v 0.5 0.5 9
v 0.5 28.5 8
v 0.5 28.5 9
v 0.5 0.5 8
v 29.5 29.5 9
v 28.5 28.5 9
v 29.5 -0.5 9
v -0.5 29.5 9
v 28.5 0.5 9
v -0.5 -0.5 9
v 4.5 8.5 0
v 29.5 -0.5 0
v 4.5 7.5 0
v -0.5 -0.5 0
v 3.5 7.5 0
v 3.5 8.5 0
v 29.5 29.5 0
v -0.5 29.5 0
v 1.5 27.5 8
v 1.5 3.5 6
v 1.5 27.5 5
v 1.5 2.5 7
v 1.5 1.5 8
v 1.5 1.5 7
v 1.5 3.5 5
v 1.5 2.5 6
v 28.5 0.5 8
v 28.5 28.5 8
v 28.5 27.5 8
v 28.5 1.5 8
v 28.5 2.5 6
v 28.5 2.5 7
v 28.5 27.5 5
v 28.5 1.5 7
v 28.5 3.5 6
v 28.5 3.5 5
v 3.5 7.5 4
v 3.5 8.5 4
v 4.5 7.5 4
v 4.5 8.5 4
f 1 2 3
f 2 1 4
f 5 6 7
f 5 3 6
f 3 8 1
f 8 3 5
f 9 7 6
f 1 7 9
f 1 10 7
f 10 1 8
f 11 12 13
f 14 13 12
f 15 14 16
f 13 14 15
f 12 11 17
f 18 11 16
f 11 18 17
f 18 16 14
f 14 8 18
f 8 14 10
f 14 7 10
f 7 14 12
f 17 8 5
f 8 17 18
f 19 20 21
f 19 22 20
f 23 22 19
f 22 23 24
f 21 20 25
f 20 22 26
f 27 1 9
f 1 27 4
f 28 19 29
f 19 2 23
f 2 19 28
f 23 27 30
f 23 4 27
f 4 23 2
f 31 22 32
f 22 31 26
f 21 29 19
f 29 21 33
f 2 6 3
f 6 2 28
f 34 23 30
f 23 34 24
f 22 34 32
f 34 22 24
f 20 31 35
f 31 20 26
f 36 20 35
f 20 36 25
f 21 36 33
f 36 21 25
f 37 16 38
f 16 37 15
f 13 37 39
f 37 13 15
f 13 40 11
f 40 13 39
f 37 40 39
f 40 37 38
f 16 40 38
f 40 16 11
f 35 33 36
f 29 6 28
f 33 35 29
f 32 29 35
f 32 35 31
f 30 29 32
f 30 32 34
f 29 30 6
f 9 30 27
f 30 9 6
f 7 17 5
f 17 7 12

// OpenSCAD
union() {
    translate([0, 0, 4.5]) cube([1, 1, 9], center=true);
    translate([0, 1, 4.5]) cube([1, 1, 9], center=true);
    translate([0, 2, 4.5]) cube([1, 1, 9], center=true);
    translate([0, 3, 4.5]) cube([1, 1, 9], center=true);
    translate([0, 4, 4.5]) cube([1, 1, 9], center=true);
    translate([0, 5, 4.5]) cube([1, 1, 9], center=true);
    translate([0, 6, 4.5]) cube([1, 1, 9], center=true);
    translate([0, 7, 4.5]) cube([1, 1, 9], center=true);
    translate([0, 8, 4.5]) cube([1, 1, 9], center=true);
    translate([0, 9, 4.5]) cube([1, 1, 9], center=true);
    translate([0, 10, 4.5]) cube([1, 1, 9], center=true);
    translate([0, 11, 4.5]) cube([1, 1, 9], center=true);
    translate([0, 12, 4.5]) cube([1, 1, 9], center=true);
    translate([0, 13, 4.5]) cube([1, 1, 9], center=true);
    translate([0, 14, 4.5]) cube([1, 1, 9], center=true);
    translate([0, 15, 4.5]) cube([1, 1, 9], center=true);
    translate([0, 16, 4.5]) cube([1, 1, 9], center=true);
    translate([0, 17, 4.5]) cube([1, 1, 9], center=true);
    translate([0, 18, 4.5]) cube([1, 1, 9], center=true);
    translate([0, 19, 4.5]) cube([1, 1, 9], center=true);
    translate([0, 20, 4.5]) cube([1, 1, 9], center=true);
    translate([0, 21, 4.5]) cube([1, 1, 9], center=true);
    translate([0, 22, 4.5]) cube([1, 1, 9], center=true);
    translate([0, 23, 4.5]) cube([1, 1, 9], center=true);
    translate([0, 24, 4.5]) cube([1, 1, 9], center=true);
    translate([0, 25, 4.5]) cube([1, 1, 9], center=true);
    translate([0, 26, 4.5]) cube([1, 1, 9], center=true);
    translate([0, 27, 4.5]) cube([1, 1, 9], center=true);
    translate([0, 28, 4.5]) cube([1, 1, 9], center=true);
    translate([0, 29, 4.5]) cube([1, 1, 9], center=true);
    translate([1, 0, 4.5]) cube([1, 1, 9], center=true);
    translate([1, 1, 4.0]) cube([1, 1, 8], center=true);
    translate([1, 2, 4.0]) cube([1, 1, 8], center=true);
    translate([1, 3, 4.0]) cube([1, 1, 8], center=true);
    translate([1, 4, 4.0]) cube([1, 1, 8], center=true);
    translate([1, 5, 4.0]) cube([1, 1, 8], center=true);
    translate([1, 6, 4.0]) cube([1, 1, 8], center=true);
    translate([1, 7, 4.0]) cube([1, 1, 8], center=true);
    translate([1, 8, 4.0]) cube([1, 1, 8], center=true);
    translate([1, 9, 4.0]) cube([1, 1, 8], center=true);
    translate([1, 10, 4.0]) cube([1, 1, 8], center=true);
    translate([1, 11, 4.0]) cube([1, 1, 8], center=true);
    translate([1, 12, 4.0]) cube([1, 1, 8], center=true);
    translate([1, 13, 4.0]) cube([1, 1, 8], center=true);
    translate([1, 14, 4.0]) cube([1, 1, 8], center=true);
    translate([1, 15, 4.0]) cube([1, 1, 8], center=true);
    translate([1, 16, 4.0]) cube([1, 1, 8], center=true);
    translate([1, 17, 4.0]) cube([1, 1, 8], center=true);
    translate([1, 18, 4.0]) cube([1, 1, 8], center=true);
    translate([1, 19, 4.0]) cube([1, 1, 8], center=true);
    translate([1, 20, 4.0]) cube([1, 1, 8], center=true);
    translate([1, 21, 4.0]) cube([1, 1, 8], center=true);
    translate([1, 22, 4.0]) cube([1, 1, 8], center=true);
    translate([1, 23, 4.0]) cube([1, 1, 8], center=true);
    translate([1, 24, 4.0]) cube([1, 1, 8], center=true);
    translate([1, 25, 4.0]) cube([1, 1, 8], center=true);
    translate([1, 26, 4.0]) cube([1, 1, 8], center=true);
    translate([1, 27, 4.0]) cube([1, 1, 8], center=true);
    translate([1, 28, 4.0]) cube([1, 1, 8], center=true);
    translate([1, 29, 4.5]) cube([1, 1, 9], center=true);
    translate([2, 0, 4.5]) cube([1, 1, 9], center=true);
    translate([2, 1, 4.0]) cube([1, 1, 8], center=true);
    translate([2, 2, 3.5]) cube([1, 1, 7], center=true);
    translate([2, 3, 3.0]) cube([1, 1, 6], center=true);
    translate([2, 4, 2.5]) cube([1, 1, 5], center=true);
    translate([2, 5, 2.5]) cube([1, 1, 5], center=true);
    translate([2, 6, 2.5]) cube([1, 1, 5], center=true);
    translate([2, 7, 2.5]) cube([1, 1, 5], center=true);
    translate([2, 8, 2.5]) cube([1, 1, 5], center=true);
    translate([2, 9, 2.5]) cube([1, 1, 5], center=true);
    translate([2, 10, 2.5]) cube([1, 1, 5], center=true);
    translate([2, 11, 2.5]) cube([1, 1, 5], center=true);
    translate([2, 12, 2.5]) cube([1, 1, 5], center=true);
    translate([2, 13, 2.5]) cube([1, 1, 5], center=true);
    translate([2, 14, 2.5]) cube([1, 1, 5], center=true);
    translate([2, 15, 2.5]) cube([1, 1, 5], center=true);
    translate([2, 16, 2.5]) cube([1, 1, 5], center=true);
    translate([2, 17, 2.5]) cube([1, 1, 5], center=true);
    translate([2, 18, 2.5]) cube([1, 1, 5], center=true);
    translate([2, 19, 2.5]) cube([1, 1, 5], center=true);
    translate([2, 20, 2.5]) cube([1, 1, 5], center=true);
    translate([2, 21, 2.5]) cube([1, 1, 5], center=true);
    translate([2, 22, 2.5]) cube([1, 1, 5], center=true);
    translate([2, 23, 2.5]) cube([1, 1, 5], center=true);
    translate([2, 24, 2.5]) cube([1, 1, 5], center=true);
    translate([2, 25, 2.5]) cube([1, 1, 5], center=true);
    translate([2, 26, 2.5]) cube([1, 1, 5], center=true);
    translate([2, 27, 2.5]) cube([1, 1, 5], center=true);
    translate([2, 28, 4.0]) cube([1, 1, 8], center=true);
    translate([2, 29, 4.5]) cube([1, 1, 9], center=true);
    translate([3, 0, 4.5]) cube([1, 1, 9], center=true);
    translate([3, 1, 4.0]) cube([1, 1, 8], center=true);
    translate([3, 2, 3.5]) cube([1, 1, 7], center=true);
    translate([3, 3, 3.0]) cube([1, 1, 6], center=true);
    translate([3, 4, 2.5]) cube([1, 1, 5], center=true);
    translate([3, 5, 2.5]) cube([1, 1, 5], center=true);
    translate([3, 6, 2.5]) cube([1, 1, 5], center=true);
    translate([3, 7, 2.5]) cube([1, 1, 5], center=true);
    translate([3, 8, 2.5]) cube([1, 1, 5], center=true);
    translate([3, 9, 2.5]) cube([1, 1, 5], center=true);
    translate([3, 10, 2.5]) cube([1, 1, 5], center=true);
    translate([3, 11, 2.5]) cube([1, 1, 5], center=true);
    translate([3, 12, 2.5]) cube([1, 1, 5], center=true);
    translate([3, 13, 2.5]) cube([1, 1, 5], center=true);
    translate([3, 14, 2.5]) cube([1, 1, 5], center=true);
    translate([3, 15, 2.5]) cube([1, 1, 5], center=true);
    translate([3, 16, 2.5]) cube([1, 1, 5], center=true);
    translate([3, 17, 2.5]) cube([1, 1, 5], center=true);
    translate([3, 18, 2.5]) cube([1, 1, 5], center=true);
    translate([3, 19, 2.5]) cube([1, 1, 5], center=true);
    translate([3, 20, 2.5]) cube([1, 1, 5], center=true);
    translate([3, 21, 2.5]) cube([1, 1, 5], center=true);
    translate([3, 22, 2.5]) cube([1, 1, 5], center=true);
    translate([3, 23, 2.5]) cube([1, 1, 5], center=true);
    translate([3, 24, 2.5]) cube([1, 1, 5], center=true);
    translate([3, 25, 2.5]) cube([1, 1, 5], center=true);
    translate([3, 26, 2.5]) cube([1, 1, 5], center=true);
    translate([3, 27, 2.5]) cube([1, 1, 5], center=true);
    translate([3, 28, 4.0]) cube([1, 1, 8], center=true);
    translate([3, 29, 4.5]) cube([1, 1, 9], center=true);
    translate([4, 0, 4.5]) cube([1, 1, 9], center=true);
    translate([4, 1, 4.0]) cube([1, 1, 8], center=true);
    translate([4, 2, 3.5]) cube([1, 1, 7], center=true);
    translate([4, 3, 3.0]) cube([1, 1, 6], center=true);
    translate([4, 4, 2.5]) cube([1, 1, 5], center=true);
    translate([4, 5, 2.5]) cube([1, 1, 5], center=true);
    translate([4, 6, 2.5]) cube([1, 1, 5], center=true);
    translate([4, 7, 2.5]) cube([1, 1, 5], center=true);
    translate([4, 8, 4.5]) color([1, 0, 0]) cube([1, 1, 1], center=true);
    translate([4, 9, 2.5]) cube([1, 1, 5], center=true);
    translate([4, 10, 2.5]) cube([1, 1, 5], center=true);
    translate([4, 11, 2.5]) cube([1, 1, 5], center=true);
    translate([4, 12, 2.5]) cube([1, 1, 5], center=true);
    translate([4, 13, 2.5]) cube([1, 1, 5], center=true);
    translate([4, 14, 2.5]) cube([1, 1, 5], center=true);
    translate([4, 15, 2.5]) cube([1, 1, 5], center=true);
    translate([4, 16, 2.5]) cube([1, 1, 5], center=true);
    translate([4, 17, 2.5]) cube([1, 1, 5], center=true);
    translate([4, 18, 2.5]) cube([1, 1, 5], center=true);
    translate([4, 19, 2.5]) cube([1, 1, 5], center=true);
    translate([4, 20, 2.5]) cube([1, 1, 5], center=true);
    translate([4, 21, 2.5]) cube([1, 1, 5], center=true);
    translate([4, 22, 2.5]) cube([1, 1, 5], center=true);
    translate([4, 23, 2.5]) cube([1, 1, 5], center=true);
    translate([4, 24, 2.5]) cube([1, 1, 5], center=true);
    translate([4, 25, 2.5]) cube([1, 1, 5], center=true);
    translate([4, 26, 2.5]) cube([1, 1, 5], center=true);
    translate([4, 27, 2.5]) cube([1, 1, 5], center=true);
    translate([4, 28, 4.0]) cube([1, 1, 8], center=true);
    translate([4, 29, 4.5]) cube([1, 1, 9], center=true);
    translate([5, 0, 4.5]) cube([1, 1, 9], center=true);
    translate([5, 1, 4.0]) cube([1, 1, 8], center=true);
    translate([5, 2, 3.5]) cube([1, 1, 7], center=true);
    translate([5, 3, 3.0]) cube([1, 1, 6], center=true);
    translate([5, 4, 2.5]) cube([1, 1, 5], center=true);
    translate([5, 5, 2.5]) cube([1, 1, 5], center=true);
    translate([5, 6, 2.5]) cube([1, 1, 5], center=true);
    translate([5, 7, 2.5]) cube([1, 1, 5], center=true);
    translate([5, 8, 2.5]) cube([1, 1, 5], center=true);
    translate([5, 9, 2.5]) cube([1, 1, 5], center=true);
    translate([5, 10, 2.5]) cube([1, 1, 5], center=true);
    translate([5, 11, 2.5]) cube([1, 1, 5], center=true);
    translate([5, 12, 2.5]) cube([1, 1, 5], center=true);
    translate([5, 13, 2.5]) cube([1, 1, 5], center=true);
    translate([5, 14, 2.5]) cube([1, 1, 5], center=true);
    translate([5, 15, 2.5]) cube([1, 1, 5], center=true);
    translate([5, 16, 2.5]) cube([1, 1, 5], center=true);
    translate([5, 17, 2.5]) cube([1, 1, 5], center=true);
    translate([5, 18, 2.5]) cube([1, 1, 5], center=true);
    translate([5, 19, 2.5]) cube([1, 1, 5], center=true);
    translate([5, 20, 2.5]) cube([1, 1, 5], center=true);
    translate([5, 21, 2.5]) cube([1, 1, 5], center=true);
    translate([5, 22, 2.5]) cube([1, 1, 5], center=true);
    translate([5, 23, 2.5]) cube([1, 1, 5], center=true);
    translate([5, 24, 2.5]) cube([1, 1, 5], center=true);
    translate([5, 25, 2.5]) cube([1, 1, 5], center=true);
    translate([5, 26, 2.5]) cube([1, 1, 5], center=true);
    translate([5, 27, 2.5]) cube([1, 1, 5], center=true);
    translate([5, 28, 4.0]) cube([1, 1, 8], center=true);
    translate([5, 29, 4.5]) cube([1, 1, 9], center=true);
    translate([6, 0, 4.5]) cube([1, 1, 9], center=true);
    translate([6, 1, 4.0]) cube([1, 1, 8], center=true);
    translate([6, 2, 3.5]) cube([1, 1, 7], center=true);
    translate([6, 3, 3.0]) cube([1, 1, 6], center=true);
    translate([6, 4, 2.5]) cube([1, 1, 5], center=true);
    translate([6, 5, 2.5]) cube([1, 1, 5], center=true);
    translate([6, 6, 2.5]) cube([1, 1, 5], center=true);
    translate([6, 7, 2.5]) cube([1, 1, 5], center=true);
    translate([6, 8, 2.5]) cube([1, 1, 5], center=true);
    translate([6, 9, 2.5]) cube([1, 1, 5], center=true);
    translate([6, 10, 2.5]) cube([1, 1, 5], center=true);
    translate([6, 11, 2.5]) cube([1, 1, 5], center=true);
    translate([6, 12, 2.5]) cube([1, 1, 5], center=true);
    translate([6, 13, 2.5]) cube([1, 1, 5], center=true);
    translate([6, 14, 2.5]) cube([1, 1, 5], center=true);
    translate([6, 15, 2.5]) cube([1, 1, 5], center=true);
    translate([6, 16, 2.5]) cube([1, 1, 5], center=true);
    translate([6, 17, 2.5]) cube([1, 1, 5], center=true);
    translate([6, 18, 2.5]) cube([1, 1, 5], center=true);
    translate([6, 19, 2.5]) cube([1, 1, 5], center=true);
    translate([6, 20, 2.5]) cube([1, 1, 5], center=true);
    translate([6, 21, 2.5]) cube([1, 1, 5], center=true);
    translate([6, 22, 2.5]) cube([1, 1, 5], center=true);
    translate([6, 23, 2.5]) cube([1, 1, 5], center=true);
    translate([6, 24, 2.5]) cube([1, 1, 5], center=true);
    translate([6, 25, 2.5]) cube([1, 1, 5], center=true);
    translate([6, 26, 2.5]) cube([1, 1, 5], center=true);
    translate([6, 27, 2.5]) cube([1, 1, 5], center=true);
    translate([6, 28, 4.0]) cube([1, 1, 8], center=true);
    translate([6, 29, 4.5]) cube([1, 1, 9], center=true);
    translate([7, 0, 4.5]) cube([1, 1, 9], center=true);
    translate([7, 1, 4.0]) cube([1, 1, 8], center=true);
    translate([7, 2, 3.5]) cube([1, 1, 7], center=true);
    translate([7, 3, 3.0]) cube([1, 1, 6], center=true);
    translate([7, 4, 2.5]) cube([1, 1, 5], center=true);
    translate([7, 5, 2.5]) cube([1, 1, 5], center=true);
    translate([7, 6, 2.5]) cube([1, 1, 5], center=true);
    translate([7, 7, 2.5]) cube([1, 1, 5], center=true);
    translate([7, 8, 2.5]) cube([1, 1, 5], center=true);
    translate([7, 9, 2.5]) cube([1, 1, 5], center=true);
    translate([7, 10, 2.5]) cube([1, 1, 5], center=true);
    translate([7, 11, 2.5]) cube([1, 1, 5], center=true);
    translate([7, 12, 2.5]) cube([1, 1, 5], center=true);
    translate([7, 13, 2.5]) cube([1, 1, 5], center=true);
    translate([7, 14, 2.5]) cube([1, 1, 5], center=true);
    translate([7, 15, 2.5]) cube([1, 1, 5], center=true);
    translate([7, 16, 2.5]) cube([1, 1, 5], center=true);
    translate([7, 17, 2.5]) cube([1, 1, 5], center=true);
    translate([7, 18, 2.5]) cube([1, 1, 5], center=true);
    translate([7, 19, 2.5]) cube([1, 1, 5], center=true);
    translate([7, 20, 2.5]) cube([1, 1, 5], center=true);
    translate([7, 21, 2.5]) cube([1, 1, 5], center=true);
    translate([7, 22, 2.5]) cube([1, 1, 5], center=true);
    translate([7, 23, 2.5]) cube([1, 1, 5], center=true);
    translate([7, 24, 2.5]) cube([1, 1, 5], center=true);
    translate([7, 25, 2.5]) cube([1, 1, 5], center=true);
    translate([7, 26, 2.5]) cube([1, 1, 5], center=true);
    translate([7, 27, 2.5]) cube([1, 1, 5], center=true);
    translate([7, 28, 4.0]) cube([1, 1, 8], center=true);
    translate([7, 29, 4.5]) cube([1, 1, 9], center=true);
    translate([8, 0, 4.5]) cube([1, 1, 9], center=true);
    translate([8, 1, 4.0]) cube([1, 1, 8], center=true);
    translate([8, 2, 3.5]) cube([1, 1, 7], center=true);
    translate([8, 3, 3.0]) cube([1, 1, 6], center=true);
    translate([8, 4, 2.5]) cube([1, 1, 5], center=true);
    translate([8, 5, 2.5]) cube([1, 1, 5], center=true);
    translate([8, 6, 2.5]) cube([1, 1, 5], center=true);
    translate([8, 7, 2.5]) cube([1, 1, 5], center=true);
    translate([8, 8, 2.5]) cube([1, 1, 5], center=true);
    translate([8, 9, 2.5]) cube([1, 1, 5], center=true);
    translate([8, 10, 2.5]) cube([1, 1, 5], center=true);
    translate([8, 11, 2.5]) cube([1, 1, 5], center=true);
    translate([8, 12, 2.5]) cube([1, 1, 5], center=true);
    translate([8, 13, 2.5]) cube([1, 1, 5], center=true);
    translate([8, 14, 2.5]) cube([1, 1, 5], center=true);
    translate([8, 15, 2.5]) cube([1, 1, 5], center=true);
    translate([8, 16, 2.5]) cube([1, 1, 5], center=true);
    translate([8, 17, 2.5]) cube([1, 1, 5], center=true);
    translate([8, 18, 2.5]) cube([1, 1, 5], center=true);
    translate([8, 19, 2.5]) cube([1, 1, 5], center=true);
    translate([8, 20, 2.5]) cube([1, 1, 5], center=true);
    translate([8, 21, 2.5]) cube([1, 1, 5], center=true);
    translate([8, 22, 2.5]) cube([1, 1, 5], center=true);
    translate([8, 23, 2.5]) cube([1, 1, 5], center=true);
    translate([8, 24, 2.5]) cube([1, 1, 5], center=true);
    translate([8, 25, 2.5]) cube([1, 1, 5], center=true);
    translate([8, 26, 2.5]) cube([1, 1, 5], center=true);
    translate([8, 27, 2.5]) cube([1, 1, 5], center=true);
    translate([8, 28, 4.0]) cube([1, 1, 8], center=true);
    translate([8, 29, 4.5]) cube([1, 1, 9], center=true);
    translate([9, 0, 4.5]) cube([1, 1, 9], center=true);
    translate([9, 1, 4.0]) cube([1, 1, 8], center=true);
    translate([9, 2, 3.5]) cube([1, 1, 7], center=true);
    translate([9, 3, 3.0]) cube([1, 1, 6], center=true);
    translate([9, 4, 2.5]) cube([1, 1, 5], center=true);
    translate([9, 5, 2.5]) cube([1, 1, 5], center=true);
    translate([9, 6, 2.5]) cube([1, 1, 5], center=true);
    translate([9, 7, 2.5]) cube([1, 1, 5], center=true);
    translate([9, 8, 2.5]) cube([1, 1, 5], center=true);
    translate([9, 9, 2.5]) cube([1, 1, 5], center=true);
    translate([9, 10, 2.5]) cube([1, 1, 5], center=true);
    translate([9, 11, 2.5]) cube([1, 1, 5], center=true);
    translate([9, 12, 2.5]) cube([1, 1, 5], center=true);
    translate([9, 13, 2.5]) cube([1, 1, 5], center=true);
    translate([9, 14, 2.5]) cube([1, 1, 5], center=true);
    translate([9, 15, 2.5]) cube([1, 1, 5], center=true);
    translate([9, 16, 2.5]) cube([1, 1, 5], center=true);
    translate([9, 17, 2.5]) cube([1, 1, 5], center=true);
    translate([9, 18, 2.5]) cube([1, 1, 5], center=true);
    translate([9, 19, 2.5]) cube([1, 1, 5], center=true);
    translate([9, 20, 2.5]) cube([1, 1, 5], center=true);
    translate([9, 21, 2.5]) cube([1, 1, 5], center=true);
    translate([9, 22, 2.5]) cube([1, 1, 5], center=true);
    translate([9, 23, 2.5]) cube([1, 1, 5], center=true);
    translate([9, 24, 2.5]) cube([1, 1, 5], center=true);
    translate([9, 25, 2.5]) cube([1, 1, 5], center=true);
    translate([9, 26, 2.5]) cube([1, 1, 5], center=true);
    translate([9, 27, 2.5]) cube([1, 1, 5], center=true);
    translate([9, 28, 4.0]) cube([1, 1, 8], center=true);
    translate([9, 29, 4.5]) cube([1, 1, 9], center=true);
    translate([10, 0, 4.5]) cube([1, 1, 9], center=true);
    translate([10, 1, 4.0]) cube([1, 1, 8], center=true);
    translate([10, 2, 3.5]) cube([1, 1, 7], center=true);
    translate([10, 3, 3.0]) cube([1, 1, 6], center=true);
    translate([10, 4, 2.5]) cube([1, 1, 5], center=true);
    translate([10, 5, 2.5]) cube([1, 1, 5], center=true);
    translate([10, 6, 2.5]) cube([1, 1, 5], center=true);
    translate([10, 7, 2.5]) cube([1, 1, 5], center=true);
    translate([10, 8, 2.5]) cube([1, 1, 5], center=true);
    translate([10, 9, 2.5]) cube([1, 1, 5], center=true);
    translate([10, 10, 2.5]) cube([1, 1, 5], center=true);
    translate([10, 11, 2.5]) cube([1, 1, 5], center=true);
    translate([10, 12, 2.5]) cube([1, 1, 5], center=true);
    translate([10, 13, 2.5]) cube([1, 1, 5], center=true);
    translate([10, 14, 2.5]) cube([1, 1, 5], center=true);
    translate([10, 15, 2.5]) cube([1, 1, 5], center=true);
    translate([10, 16, 2.5]) cube([1, 1, 5], center=true);
    translate([10, 17, 2.5]) cube([1, 1, 5], center=true);
    translate([10, 18, 2.5]) cube([1, 1, 5], center=true);
    translate([10, 19, 2.5]) cube([1, 1, 5], center=true);
    translate([10, 20, 2.5]) cube([1, 1, 5], center=true);
    translate([10, 21, 2.5]) cube([1, 1, 5], center=true);
    translate([10, 22, 2.5]) cube([1, 1, 5], center=true);
    translate([10, 23, 2.5]) cube([1, 1, 5], center=true);
    translate([10, 24, 2.5]) cube([1, 1, 5], center=true);
    translate([10, 25, 2.5]) cube([1, 1, 5], center=true);
    translate([10, 26, 2.5]) cube([1, 1, 5], center=true);
    translate([10, 27, 2.5]) cube([1, 1, 5], center=true);
    translate([10, 28, 4.0]) cube([1, 1, 8], center=true);
    translate([10, 29, 4.5]) cube([1, 1, 9], center=true);
    translate([11, 0, 4.5]) cube([1, 1, 9], center=true);
    translate([11, 1, 4.0]) cube([1, 1, 8], center=true);
    translate([11, 2, 3.5]) cube([1, 1, 7], center=true);
    translate([11, 3, 3.0]) cube([1, 1, 6], center=true);
    translate([11, 4, 2.5]) cube([1, 1, 5], center=true);
    translate([11, 5, 2.5]) cube([1, 1, 5], center=true);
    translate([11, 6, 2.5]) cube([1, 1, 5], center=true);
    translate([11, 7, 2.5]) cube([1, 1, 5], center=true);
    translate([11, 8, 2.5]) cube([1, 1, 5], center=true);
    translate([11, 9, 2.5]) cube([1, 1, 5], center=true);
    translate([11, 10, 2.5]) cube([1, 1, 5], center=true);
    translate([11, 11, 2.5]) cube([1, 1, 5], center=true);
    translate([11, 12, 2.5]) cube([1, 1, 5], center=true);
    translate([11, 13, 2.5]) cube([1, 1, 5], center=true);
    translate([11, 14, 2.5]) cube([1, 1, 5], center=true);
    translate([11, 15, 2.5]) cube([1, 1, 5], center=true);
    translate([11, 16, 2.5]) cube([1, 1, 5], center=true);
    translate([11, 17, 2.5]) cube([1, 1, 5], center=true);
    translate([11, 18, 2.5]) cube([1, 1, 5], center=true);
    translate([11, 19, 2.5]) cube([1, 1, 5], center=true);
    translate([11, 20, 2.5]) cube([1, 1, 5], center=true);
    translate([11, 21, 2.5]) cube([1, 1, 5], center=true);
    translate([11, 22, 2.5]) cube([1, 1, 5], center=true);
    translate([11, 23, 2.5]) cube([1, 1, 5], center=true);
    translate([11, 24, 2.5]) cube([1, 1, 5], center=true);
    translate([11, 25, 2.5]) cube([1, 1, 5], center=true);
    translate([11, 26, 2.5]) cube([1, 1, 5], center=true);
    translate([11, 27, 2.5]) cube([1, 1, 5], center=true);
    translate([11, 28, 4.0]) cube([1, 1, 8], center=true);
    translate([11, 29, 4.5]) cube([1, 1, 9], center=true);
    translate([12, 0, 4.5]) cube([1, 1, 9], center=true);
    translate([12, 1, 4.0]) cube([1, 1, 8], center=true);
    translate([12, 2, 3.5]) cube([1, 1, 7], center=true);
    translate([12, 3, 3.0]) cube([1, 1, 6], center=true);
    translate([12, 4, 2.5]) cube([1, 1, 5], center=true);
    translate([12, 5, 2.5]) cube([1, 1, 5], center=true);
    translate([12, 6, 2.5]) cube([1, 1, 5], center=true);
    translate([12, 7, 2.5]) cube([1, 1, 5], center=true);
    translate([12, 8, 2.5]) cube([1, 1, 5], center=true);
    translate([12, 9, 2.5]) cube([1, 1, 5], center=true);
    translate([12, 10, 2.5]) cube([1, 1, 5], center=true);
    translate([12, 11, 2.5]) cube([1, 1, 5], center=true);
    translate([12, 12, 2.5]) cube([1, 1, 5], center=true);
    translate([12, 13, 2.5]) cube([1, 1, 5], center=true);
    translate([12, 14, 2.5]) cube([1, 1, 5], center=true);
    translate([12, 15, 2.5]) cube([1, 1, 5], center=true);
    translate([12, 16, 2.5]) cube([1, 1, 5], center=true);
    translate([12, 17, 2.5]) cube([1, 1, 5], center=true);
    translate([12, 18, 2.5]) cube([1, 1, 5], center=true);
    translate([12, 19, 2.5]) cube([1, 1, 5], center=true);
    translate([12, 20, 2.5]) cube([1, 1, 5], center=true);
    translate([12, 21, 2.5]) cube([1, 1, 5], center=true);
    translate([12, 22, 2.5]) cube([1, 1, 5], center=true);
    translate([12, 23, 2.5]) cube([1, 1, 5], center=true);
    translate([12, 24, 2.5]) cube([1, 1, 5], center=true);
    translate([12, 25, 2.5]) cube([1, 1, 5], center=true);
    translate([12, 26, 2.5]) cube([1, 1, 5], center=true);
    translate([12, 27, 2.5]) cube([1, 1, 5], center=true);
    translate([12, 28, 4.0]) cube([1, 1, 8], center=true);
    translate([12, 29, 4.5]) cube([1, 1, 9], center=true);
    translate([13, 0, 4.5]) cube([1, 1, 9], center=true);
    translate([13, 1, 4.0]) cube([1, 1, 8], center=true);
    translate([13, 2, 3.5]) cube([1, 1, 7], center=true);
    translate([13, 3, 3.0]) cube([1, 1, 6], center=true);
    translate([13, 4, 2.5]) cube([1, 1, 5], center=true);
    translate([13, 5, 2.5]) cube([1, 1, 5], center=true);
    translate([13, 6, 2.5]) cube([1, 1, 5], center=true);
    translate([13, 7, 2.5]) cube([1, 1, 5], center=true);
    translate([13, 8, 2.5]) cube([1, 1, 5], center=true);
    translate([13, 9, 2.5]) cube([1, 1, 5], center=true);
    translate([13, 10, 2.5]) cube([1, 1, 5], center=true);
    translate([13, 11, 2.5]) cube([1, 1, 5], center=true);
    translate([13, 12, 2.5]) cube([1, 1, 5], center=true);
    translate([13, 13, 2.5]) cube([1, 1, 5], center=true);
    translate([13, 14, 2.5]) cube([1, 1, 5], center=true);
    translate([13, 15, 2.5]) cube([1, 1, 5], center=true);
    translate([13, 16, 2.5]) cube([1, 1, 5], center=true);
    translate([13, 17, 2.5]) cube([1, 1, 5], center=true);
    translate([13, 18, 2.5]) cube([1, 1, 5], center=true);
    translate([13, 19, 2.5]) cube([1, 1, 5], center=true);
    translate([13, 20, 2.5]) cube([1, 1, 5], center=true);
    translate([13, 21, 2.5]) cube([1, 1, 5], center=true);
    translate([13, 22, 2.5]) cube([1, 1, 5], center=true);
    translate([13, 23, 2.5]) cube([1, 1, 5], center=true);
    translate([13, 24, 2.5]) cube([1, 1, 5], center=true);
    translate([13, 25, 2.5]) cube([1, 1, 5], center=true);
    translate([13, 26, 2.5]) cube([1, 1, 5], center=true);
    translate([13, 27, 2.5]) cube([1, 1, 5], center=true);
    translate([13, 28, 4.0]) cube([1, 1, 8], center=true);
    translate([13, 29, 4.5]) cube([1, 1, 9], center=true);
    translate([14, 0, 4.5]) cube([1, 1, 9], center=true);
    translate([14, 1, 4.0]) cube([1, 1, 8], center=true);
    translate([14, 2, 3.5]) cube([1, 1, 7], center=true);
    translate([14, 3, 3.0]) cube([1, 1, 6], center=true);
    translate([14, 4, 2.5]) cube([1, 1, 5], center=true);
    translate([14, 5, 2.5]) cube([1, 1, 5], center=true);
    translate([14, 6, 2.5]) cube([1, 1, 5], center=true);
    translate([14, 7, 2.5]) cube([1, 1, 5], center=true);
    translate([14, 8, 2.5]) cube([1, 1, 5], center=true);
    translate([14, 9, 2.5]) cube([1, 1, 5], center=true);
    translate([14, 10, 2.5]) cube([1, 1, 5], center=true);
    translate([14, 11, 2.5]) cube([1, 1, 5], center=true);
    translate([14, 12, 2.5]) cube([1, 1, 5], center=true);
    translate([14, 13, 2.5]) cube([1, 1, 5], center=true);
    translate([14, 14, 2.5]) cube([1, 1, 5], center=true);
    translate([14, 15, 2.5]) cube([1, 1, 5], center=true);
    translate([14, 16, 2.5]) cube([1, 1, 5], center=true);
    translate([14, 17, 2.5]) cube([1, 1, 5], center=true);
    translate([14, 18, 2.5]) cube([1, 1, 5], center=true);
    translate([14, 19, 2.5]) cube([1, 1, 5], center=true);
    translate([14, 20, 2.5]) cube([1, 1, 5], center=true);
    translate([14, 21, 2.5]) cube([1, 1, 5], center=true);
    translate([14, 22, 2.5]) cube([1, 1, 5], center=true);
    translate([14, 23, 2.5]) cube([1, 1, 5], center=true);
    translate([14, 24, 2.5]) cube([1, 1, 5], center=true);
    translate([14, 25, 2.5]) cube([1, 1, 5], center=true);
    translate([14, 26, 2.5]) cube([1, 1, 5], center=true);
    translate([14, 27, 2.5]) cube([1, 1, 5], center=true);
    translate([14, 28, 4.0]) cube([1, 1, 8], center=true);
    translate([14, 29, 4.5]) cube([1, 1, 9], center=true);
    translate([15, 0, 4.5]) cube([1, 1, 9], center=true);
    translate([15, 1, 4.0]) cube([1, 1, 8], center=true);
    translate([15, 2, 3.5]) cube([1, 1, 7], center=true);
    translate([15, 3, 3.0]) cube([1, 1, 6], center=true);
    translate([15, 4, 2.5]) cube([1, 1, 5], center=true);
    translate([15, 5, 2.5]) cube([1, 1, 5], center=true);
    translate([15, 6, 2.5]) cube([1, 1, 5], center=true);
    translate([15, 7, 2.5]) cube([1, 1, 5], center=true);
    translate([15, 8, 2.5]) cube([1, 1, 5], center=true);
    translate([15, 9, 2.5]) cube([1, 1, 5], center=true);
    translate([15, 10, 2.5]) cube([1, 1, 5], center=true);
    translate([15, 11, 2.5]) cube([1, 1, 5], center=true);
    translate([15, 12, 2.5]) cube([1, 1, 5], center=true);
    translate([15, 13, 2.5]) cube([1, 1, 5], center=true);
    translate([15, 14, 2.5]) cube([1, 1, 5], center=true);
    translate([15, 15, 2.5]) cube([1, 1, 5], center=true);
    translate([15, 16, 2.5]) cube([1, 1, 5], center=true);
    translate([15, 17, 2.5]) cube([1, 1, 5], center=true);
    translate([15, 18, 2.5]) cube([1, 1, 5], center=true);
    translate([15, 19, 2.5]) cube([1, 1, 5], center=true);
    translate([15, 20, 2.5]) cube([1, 1, 5], center=true);
    translate([15, 21, 2.5]) cube([1, 1, 5], center=true);
    translate([15, 22, 2.5]) cube([1, 1, 5], center=true);
    translate([15, 23, 2.5]) cube([1, 1, 5], center=true);
    translate([15, 24, 2.5]) cube([1, 1, 5], center=true);
    translate([15, 25, 2.5]) cube([1, 1, 5], center=true);
    translate([15, 26, 2.5]) cube([1, 1, 5], center=true);
    translate([15, 27, 2.5]) cube([1, 1, 5], center=true);
    translate([15, 28, 4.0]) cube([1, 1, 8], center=true);
    translate([15, 29, 4.5]) cube([1, 1, 9], center=true);
    translate([16, 0, 4.5]) cube([1, 1, 9], center=true);
    translate([16, 1, 4.0]) cube([1, 1, 8], center=true);
    translate([16, 2, 3.5]) cube([1, 1, 7], center=true);
    translate([16, 3, 3.0]) cube([1, 1, 6], center=true);
    translate([16, 4, 2.5]) cube([1, 1, 5], center=true);
    translate([16, 5, 2.5]) cube([1, 1, 5], center=true);
    translate([16, 6, 2.5]) cube([1, 1, 5], center=true);
    translate([16, 7, 2.5]) cube([1, 1, 5], center=true);
    translate([16, 8, 2.5]) cube([1, 1, 5], center=true);
    translate([16, 9, 2.5]) cube([1, 1, 5], center=true);
    translate([16, 10, 2.5]) cube([1, 1, 5], center=true);
    translate([16, 11, 2.5]) cube([1, 1, 5], center=true);
    translate([16, 12, 2.5]) cube([1, 1, 5], center=true);
    translate([16, 13, 2.5]) cube([1, 1, 5], center=true);
    translate([16, 14, 2.5]) cube([1, 1, 5], center=true);
    translate([16, 15, 2.5]) cube([1, 1, 5], center=true);
    translate([16, 16, 2.5]) cube([1, 1, 5], center=true);
    translate([16, 17, 2.5]) cube([1, 1, 5], center=true);
    translate([16, 18, 2.5]) cube([1, 1, 5], center=true);
    translate([16, 19, 2.5]) cube([1, 1, 5], center=true);
    translate([16, 20, 2.5]) cube([1, 1, 5], center=true);
    translate([16, 21, 2.5]) cube([1, 1, 5], center=true);
    translate([16, 22, 2.5]) cube([1, 1, 5], center=true);
    translate([16, 23, 2.5]) cube([1, 1, 5], center=true);
    translate([16, 24, 2.5]) cube([1, 1, 5], center=true);
    translate([16, 25, 2.5]) cube([1, 1, 5], center=true);
    translate([16, 26, 2.5]) cube([1, 1, 5], center=true);
    translate([16, 27, 2.5]) cube([1, 1, 5], center=true);
    translate([16, 28, 4.0]) cube([1, 1, 8], center=true);
    translate([16, 29, 4.5]) cube([1, 1, 9], center=true);
    translate([17, 0, 4.5]) cube([1, 1, 9], center=true);
    translate([17, 1, 4.0]) cube([1, 1, 8], center=true);
    translate([17, 2, 3.5]) cube([1, 1, 7], center=true);
    translate([17, 3, 3.0]) cube([1, 1, 6], center=true);
    translate([17, 4, 2.5]) cube([1, 1, 5], center=true);
    translate([17, 5, 2.5]) cube([1, 1, 5], center=true);
    translate([17, 6, 2.5]) cube([1, 1, 5], center=true);
    translate([17, 7, 2.5]) cube([1, 1, 5], center=true);
    translate([17, 8, 2.5]) cube([1, 1, 5], center=true);
    translate([17, 9, 2.5]) cube([1, 1, 5], center=true);
    translate([17, 10, 2.5]) cube([1, 1, 5], center=true);
    translate([17, 11, 2.5]) cube([1, 1, 5], center=true);
    translate([17, 12, 2.5]) cube([1, 1, 5], center=true);
    translate([17, 13, 2.5]) cube([1, 1, 5], center=true);
    translate([17, 14, 2.5]) cube([1, 1, 5], center=true);
    translate([17, 15, 2.5]) cube([1, 1, 5], center=true);
    translate([17, 16, 2.5]) cube([1, 1, 5], center=true);
    translate([17, 17, 2.5]) cube([1, 1, 5], center=true);
    translate([17, 18, 2.5]) cube([1, 1, 5], center=true);
    translate([17, 19, 2.5]) cube([1, 1, 5], center=true);
    translate([17, 20, 2.5]) cube([1, 1, 5], center=true);
    translate([17, 21, 2.5]) cube([1, 1, 5], center=true);
    translate([17, 22, 2.5]) cube([1, 1, 5], center=true);
    translate([17, 23, 2.5]) cube([1, 1, 5], center=true);
    translate([17, 24, 2.5]) cube([1, 1, 5], center=true);
    translate([17, 25, 2.5]) cube([1, 1, 5], center=true);
    translate([17, 26, 2.5]) cube([1, 1, 5], center=true);
    translate([17, 27, 2.5]) cube([1, 1, 5], center=true);
    translate([17, 28, 4.0]) cube([1, 1, 8], center=true);
    translate([17, 29, 4.5]) cube([1, 1, 9], center=true);
    translate([18, 0, 4.5]) cube([1, 1, 9], center=true);
    translate([18, 1, 4.0]) cube([1, 1, 8], center=true);
    translate([18, 2, 3.5]) cube([1, 1, 7], center=true);
    translate([18, 3, 3.0]) cube([1, 1, 6], center=true);
    translate([18, 4, 2.5]) cube([1, 1, 5], center=true);
    translate([18, 5, 2.5]) cube([1, 1, 5], center=true);
    translate([18, 6, 2.5]) cube([1, 1, 5], center=true);
    translate([18, 7, 2.5]) cube([1, 1, 5], center=true);
    translate([18, 8, 2.5]) cube([1, 1, 5], center=true);
    translate([18, 9, 2.5]) cube([1, 1, 5], center=true);
    translate([18, 10, 2.5]) cube([1, 1, 5], center=true);
    translate([18, 11, 2.5]) cube([1, 1, 5], center=true);
    translate([18, 12, 2.5]) cube([1, 1, 5], center=true);
    translate([18, 13, 2.5]) cube([1, 1, 5], center=true);
    translate([18, 14, 2.5]) cube([1, 1, 5], center=true);
    translate([18, 15, 2.5]) cube([1, 1, 5], center=true);
    translate([18, 16, 2.5]) cube([1, 1, 5], center=true);
    translate([18, 17, 2.5]) cube([1, 1, 5], center=true);
    translate([18, 18, 2.5]) cube([1, 1, 5], center=true);
    translate([18, 19, 2.5]) cube([1, 1, 5], center=true);
    translate([18, 20, 2.5]) cube([1, 1, 5], center=true);
    translate([18, 21, 2.5]) cube([1, 1, 5], center=true);
    translate([18, 22, 2.5]) cube([1, 1, 5], center=true);
    translate([18, 23, 2.5]) cube([1, 1, 5], center=true);
    translate([18, 24, 2.5]) cube([1, 1, 5], center=true);
    translate([18, 25, 2.5]) cube([1, 1, 5], center=true);
    translate([18, 26, 2.5]) cube([1, 1, 5], center=true);
    translate([18, 27, 2.5]) cube([1, 1, 5], center=true);
    translate([18, 28, 4.0]) cube([1, 1, 8], center=true);
    translate([18, 29, 4.5]) cube([1, 1, 9], center=true);
    translate([19, 0, 4.5]) cube([1, 1, 9], center=true);
    translate([19, 1, 4.0]) cube([1, 1, 8], center=true);
    translate([19, 2, 3.5]) cube([1, 1, 7], center=true);
    translate([19, 3, 3.0]) cube([1, 1, 6], center=true);
    translate([19, 4, 2.5]) cube([1, 1, 5], center=true);
    translate([19, 5, 2.5]) cube([1, 1, 5], center=true);
    translate([19, 6, 2.5]) cube([1, 1, 5], center=true);
    translate([19, 7, 2.5]) cube([1, 1, 5], center=true);
    translate([19, 8, 2.5]) cube([1, 1, 5], center=true);
    translate([19, 9, 2.5]) cube([1, 1, 5], center=true);
    translate([19, 10, 2.5]) cube([1, 1, 5], center=true);
    translate([19, 11, 2.5]) cube([1, 1, 5], center=true);
    translate([19, 12, 2.5]) cube([1, 1, 5], center=true);
    translate([19, 13, 2.5]) cube([1, 1, 5], center=true);
    translate([19, 14, 2.5]) cube([1, 1, 5], center=true);
    translate([19, 15, 2.5]) cube([1, 1, 5], center=true);
    translate([19, 16, 2.5]) cube([1, 1, 5], center=true);
    translate([19, 17, 2.5]) cube([1, 1, 5], center=true);
    translate([19, 18, 2.5]) cube([1, 1, 5], center=true);
    translate([19, 19, 2.5]) cube([1, 1, 5], center=true);
    translate([19, 20, 2.5]) cube([1, 1, 5], center=true);
    translate([19, 21, 2.5]) cube([1, 1, 5], center=true);
    translate([19, 22, 2.5]) cube([1, 1, 5], center=true);
    translate([19, 23, 2.5]) cube([1, 1, 5], center=true);
    translate([19, 24, 2.5]) cube([1, 1, 5], center=true);
    translate([19, 25, 2.5]) cube([1, 1, 5], center=true);
    translate([19, 26, 2.5]) cube([1, 1, 5], center=true);
    translate([19, 27, 2.5]) cube([1, 1, 5], center=true);
    translate([19, 28, 4.0]) cube([1, 1, 8], center=true);
    translate([19, 29, 4.5]) cube([1, 1, 9], center=true);
    translate([20, 0, 4.5]) cube([1, 1, 9], center=true);
    translate([20, 1, 4.0]) cube([1, 1, 8], center=true);
    translate([20, 2, 3.5]) cube([1, 1, 7], center=true);
    translate([20, 3, 3.0]) cube([1, 1, 6], center=true);
    translate([20, 4, 2.5]) cube([1, 1, 5], center=true);
    translate([20, 5, 2.5]) cube([1, 1, 5], center=true);
    translate([20, 6, 2.5]) cube([1, 1, 5], center=true);
    translate([20, 7, 2.5]) cube([1, 1, 5], center=true);
    translate([20, 8, 2.5]) cube([1, 1, 5], center=true);
    translate([20, 9, 2.5]) cube([1, 1, 5], center=true);
    translate([20, 10, 2.5]) cube([1, 1, 5], center=true);
    translate([20, 11, 2.5]) cube([1, 1, 5], center=true);
    translate([20, 12, 2.5]) cube([1, 1, 5], center=true);
    translate([20, 13, 2.5]) cube([1, 1, 5], center=true);
    translate([20, 14, 2.5]) cube([1, 1, 5], center=true);
    translate([20, 15, 2.5]) cube([1, 1, 5], center=true);
    translate([20, 16, 2.5]) cube([1, 1, 5], center=true);
    translate([20, 17, 2.5]) cube([1, 1, 5], center=true);
    translate([20, 18, 2.5]) cube([1, 1, 5], center=true);
    translate([20, 19, 2.5]) cube([1, 1, 5], center=true);
    translate([20, 20, 2.5]) cube([1, 1, 5], center=true);
    translate([20, 21, 2.5]) cube([1, 1, 5], center=true);
    translate([20, 22, 2.5]) cube([1, 1, 5], center=true);
    translate([20, 23, 2.5]) cube([1, 1, 5], center=true);
    translate([20, 24, 2.5]) cube([1, 1, 5], center=true);
    translate([20, 25, 2.5]) cube([1, 1, 5], center=true);
    translate([20, 26, 2.5]) cube([1, 1, 5], center=true);
    translate([20, 27, 2.5]) cube([1, 1, 5], center=true);
    translate([20, 28, 4.0]) cube([1, 1, 8], center=true);
    translate([20, 29, 4.5]) cube([1, 1, 9], center=true);
    translate([21, 0, 4.5]) cube([1, 1, 9], center=true);
    translate([21, 1, 4.0]) cube([1, 1, 8], center=true);
    translate([21, 2, 3.5]) cube([1, 1, 7], center=true);
    translate([21, 3, 3.0]) cube([1, 1, 6], center=true);
    translate([21, 4, 2.5]) cube([1, 1, 5], center=true);
    translate([21, 5, 2.5]) cube([1, 1, 5], center=true);
    translate([21, 6, 2.5]) cube([1, 1, 5], center=true);
    translate([21, 7, 2.5]) cube([1, 1, 5], center=true);
    translate([21, 8, 2.5]) cube([1, 1, 5], center=true);
    translate([21, 9, 2.5]) cube([1, 1, 5], center=true);
    translate([21, 10, 2.5]) cube([1, 1, 5], center=true);
    translate([21, 11, 2.5]) cube([1, 1, 5], center=true);
    translate([21, 12, 2.5]) cube([1, 1, 5], center=true);
    translate([21, 13, 2.5]) cube([1, 1, 5], center=true);
    translate([21, 14, 2.5]) cube([1, 1, 5], center=true);
    translate([21, 15, 2.5]) cube([1, 1, 5], center=true);
    translate([21, 16, 2.5]) cube([1, 1, 5], center=true);
    translate([21, 17, 2.5]) cube([1, 1, 5], center=true);
    translate([21, 18, 2.5]) cube([1, 1, 5], center=true);
    translate([21, 19, 2.5]) cube([1, 1, 5], center=true);
    translate([21, 20, 2.5]) cube([1, 1, 5], center=true);
    translate([21, 21, 2.5]) cube([1, 1, 5], center=true);
    translate([21, 22, 2.5]) cube([1, 1, 5], center=true);
    translate([21, 23, 2.5]) cube([1, 1, 5], center=true);
    translate([21, 24, 2.5]) cube([1, 1, 5], center=true);
    translate([21, 25, 2.5]) cube([1, 1, 5], center=true);
    translate([21, 26, 2.5]) cube([1, 1, 5], center=true);
    translate([21, 27, 2.5]) cube([1, 1, 5], center=true);
    translate([21, 28, 4.0]) cube([1, 1, 8], center=true);
    translate([21, 29, 4.5]) cube([1, 1, 9], center=true);
    translate([22, 0, 4.5]) cube([1, 1, 9], center=true);
    translate([22, 1, 4.0]) cube([1, 1, 8], center=true);
    translate([22, 2, 3.5]) cube([1, 1, 7], center=true);
    translate([22, 3, 3.0]) cube([1, 1, 6], center=true);
    translate([22, 4, 2.5]) cube([1, 1, 5], center=true);
    translate([22, 5, 2.5]) cube([1, 1, 5], center=true);
    translate([22, 6, 2.5]) cube([1, 1, 5], center=true);
    translate([22, 7, 2.5]) cube([1, 1, 5], center=true);
    translate([22, 8, 2.5]) cube([1, 1, 5], center=true);
    translate([22, 9, 2.5]) cube([1, 1, 5], center=true);
    translate([22, 10, 2.5]) cube([1, 1, 5], center=true);
    translate([22, 11, 2.5]) cube([1, 1, 5], center=true);
    translate([22, 12, 2.5]) cube([1, 1, 5], center=true);
    translate([22, 13, 2.5]) cube([1, 1, 5], center=true);
    translate([22, 14, 2.5]) cube([1, 1, 5], center=true);
    translate([22, 15, 2.5]) cube([1, 1, 5], center=true);
    translate([22, 16, 2.5]) cube([1, 1, 5], center=true);
    translate([22, 17, 2.5]) cube([1, 1, 5], center=true);
    translate([22, 18, 2.5]) cube([1, 1, 5], center=true);
    translate([22, 19, 2.5]) cube([1, 1, 5], center=true);
    translate([22, 20, 2.5]) cube([1, 1, 5], center=true);
    translate([22, 21, 2.5]) cube([1, 1, 5], center=true);
    translate([22, 22, 2.5]) cube([1, 1, 5], center=true);
    translate([22, 23, 2.5]) cube([1, 1, 5], center=true);
    translate([22, 24, 2.5]) cube([1, 1, 5], center=true);
    translate([22, 25, 2.5]) cube([1, 1, 5], center=true);
    translate([22, 26, 2.5]) cube([1, 1, 5], center=true);
    translate([22, 27, 2.5]) cube([1, 1, 5], center=true);
    translate([22, 28, 4.0]) cube([1, 1, 8], center=true);
    translate([22, 29, 4.5]) cube([1, 1, 9], center=true);
    translate([23, 0, 4.5]) cube([1, 1, 9], center=true);
    translate([23, 1, 4.0]) cube([1, 1, 8], center=true);
    translate([23, 2, 3.5]) cube([1, 1, 7], center=true);
    translate([23, 3, 3.0]) cube([1, 1, 6], center=true);
    translate([23, 4, 2.5]) cube([1, 1, 5], center=true);
    translate([23, 5, 2.5]) cube([1, 1, 5], center=true);
    translate([23, 6, 2.5]) cube([1, 1, 5], center=true);
    translate([23, 7, 2.5]) cube([1, 1, 5], center=true);
    translate([23, 8, 2.5]) cube([1, 1, 5], center=true);
    translate([23, 9, 2.5]) cube([1, 1, 5], center=true);
    translate([23, 10, 2.5]) cube([1, 1, 5], center=true);
    translate([23, 11, 2.5]) cube([1, 1, 5], center=true);
    translate([23, 12, 2.5]) cube([1, 1, 5], center=true);
    translate([23, 13, 2.5]) cube([1, 1, 5], center=true);
    translate([23, 14, 2.5]) cube([1, 1, 5], center=true);
    translate([23, 15, 2.5]) cube([1, 1, 5], center=true);
    translate([23, 16, 2.5]) cube([1, 1, 5], center=true);
    translate([23, 17, 2.5]) cube([1, 1, 5], center=true);
    translate([23, 18, 2.5]) cube([1, 1, 5], center=true);
    translate([23, 19, 2.5]) cube([1, 1, 5], center=true);
    translate([23, 20, 2.5]) cube([1, 1, 5], center=true);
    translate([23, 21, 2.5]) cube([1, 1, 5], center=true);
    translate([23, 22, 2.5]) cube([1, 1, 5], center=true);
    translate([23, 23, 2.5]) cube([1, 1, 5], center=true);
    translate([23, 24, 2.5]) cube([1, 1, 5], center=true);
    translate([23, 25, 2.5]) cube([1, 1, 5], center=true);
    translate([23, 26, 2.5]) cube([1, 1, 5], center=true);
    translate([23, 27, 2.5]) cube([1, 1, 5], center=true);
    translate([23, 28, 4.0]) cube([1, 1, 8], center=true);
    translate([23, 29, 4.5]) cube([1, 1, 9], center=true);
    translate([24, 0, 4.5]) cube([1, 1, 9], center=true);
    translate([24, 1, 4.0]) cube([1, 1, 8], center=true);
    translate([24, 2, 3.5]) cube([1, 1, 7], center=true);
    translate([24, 3, 3.0]) cube([1, 1, 6], center=true);
    translate([24, 4, 2.5]) cube([1, 1, 5], center=true);
    translate([24, 5, 2.5]) cube([1, 1, 5], center=true);
    translate([24, 6, 2.5]) cube([1, 1, 5], center=true);
    translate([24, 7, 2.5]) cube([1, 1, 5], center=true);
    translate([24, 8, 2.5]) cube([1, 1, 5], center=true);
    translate([24, 9, 2.5]) cube([1, 1, 5], center=true);
    translate([24, 10, 2.5]) cube([1, 1, 5], center=true);
    translate([24, 11, 2.5]) cube([1, 1, 5], center=true);
    translate([24, 12, 2.5]) cube([1, 1, 5], center=true);
    translate([24, 13, 2.5]) cube([1, 1, 5], center=true);
    translate([24, 14, 2.5]) cube([1, 1, 5], center=true);
    translate([24, 15, 2.5]) cube([1, 1, 5], center=true);
    translate([24, 16, 2.5]) cube([1, 1, 5], center=true);
    translate([24, 17, 2.5]) cube([1, 1, 5], center=true);
    translate([24, 18, 2.5]) cube([1, 1, 5], center=true);
    translate([24, 19, 2.5]) cube([1, 1, 5], center=true);
    translate([24, 20, 2.5]) cube([1, 1, 5], center=true);
    translate([24, 21, 2.5]) cube([1, 1, 5], center=true);
    translate([24, 22, 2.5]) cube([1, 1, 5], center=true);
    translate([24, 23, 2.5]) cube([1, 1, 5], center=true);
    translate([24, 24, 2.5]) cube([1, 1, 5], center=true);
    translate([24, 25, 2.5]) cube([1, 1, 5], center=true);
    translate([24, 26, 2.5]) cube([1, 1, 5], center=true);
    translate([24, 27, 2.5]) cube([1, 1, 5], center=true);
    translate([24, 28, 4.0]) cube([1, 1, 8], center=true);
    translate([24, 29, 4.5]) cube([1, 1, 9], center=true);
    translate([25, 0, 4.5]) cube([1, 1, 9], center=true);
    translate([25, 1, 4.0]) cube([1, 1, 8], center=true);
    translate([25, 2, 3.5]) cube([1, 1, 7], center=true);
    translate([25, 3, 3.0]) cube([1, 1, 6], center=true);
    translate([25, 4, 2.5]) cube([1, 1, 5], center=true);
    translate([25, 5, 2.5]) cube([1, 1, 5], center=true);
    translate([25, 6, 2.5]) cube([1, 1, 5], center=true);
    translate([25, 7, 2.5]) cube([1, 1, 5], center=true);
    translate([25, 8, 2.5]) cube([1, 1, 5], center=true);
    translate([25, 9, 2.5]) cube([1, 1, 5], center=true);
    translate([25, 10, 2.5]) cube([1, 1, 5], center=true);
    translate([25, 11, 2.5]) cube([1, 1, 5], center=true);
    translate([25, 12, 2.5]) cube([1, 1, 5], center=true);
    translate([25, 13, 2.5]) cube([1, 1, 5], center=true);
    translate([25, 14, 2.5]) cube([1, 1, 5], center=true);
    translate([25, 15, 2.5]) cube([1, 1, 5], center=true);
    translate([25, 16, 2.5]) cube([1, 1, 5], center=true);
    translate([25, 17, 2.5]) cube([1, 1, 5], center=true);
    translate([25, 18, 2.5]) cube([1, 1, 5], center=true);
    translate([25, 19, 2.5]) cube([1, 1, 5], center=true);
    translate([25, 20, 2.5]) cube([1, 1, 5], center=true);
    translate([25, 21, 2.5]) cube([1, 1, 5], center=true);
    translate([25, 22, 2.5]) cube([1, 1, 5], center=true);
    translate([25, 23, 2.5]) cube([1, 1, 5], center=true);
    translate([25, 24, 2.5]) cube([1, 1, 5], center=true);
    translate([25, 25, 2.5]) cube([1, 1, 5], center=true);
    translate([25, 26, 2.5]) cube([1, 1, 5], center=true);
    translate([25, 27, 2.5]) cube([1, 1, 5], center=true);
    translate([25, 28, 4.0]) cube([1, 1, 8], center=true);
    translate([25, 29, 4.5]) cube([1, 1, 9], center=true);
    translate([26, 0, 4.5]) cube([1, 1, 9], center=true);
    translate([26, 1, 4.0]) cube([1, 1, 8], center=true);
    translate([26, 2, 3.5]) cube([1, 1, 7], center=true);
    translate([26, 3, 3.0]) cube([1, 1, 6], center=true);
    translate([26, 4, 2.5]) cube([1, 1, 5], center=true);
    translate([26, 5, 2.5]) cube([1, 1, 5], center=true);
    translate([26, 6, 2.5]) cube([1, 1, 5], center=true);
    translate([26, 7, 2.5]) cube([1, 1, 5], center=true);
    translate([26, 8, 2.5]) cube([1, 1, 5], center=true);
    translate([26, 9, 2.5]) cube([1, 1, 5], center=true);
    translate([26, 10, 2.5]) cube([1, 1, 5], center=true);
    translate([26, 11, 2.5]) cube([1, 1, 5], center=true);
    translate([26, 12, 2.5]) cube([1, 1, 5], center=true);
    translate([26, 13, 2.5]) cube([1, 1, 5], center=true);
    translate([26, 14, 2.5]) cube([1, 1, 5], center=true);
    translate([26, 15, 2.5]) cube([1, 1, 5], center=true);
    translate([26, 16, 2.5]) cube([1, 1, 5], center=true);
    translate([26, 17, 2.5]) cube([1, 1, 5], center=true);
    translate([26, 18, 2.5]) cube([1, 1, 5], center=true);
    translate([26, 19, 2.5]) cube([1, 1, 5], center=true);
    translate([26, 20, 2.5]) cube([1, 1, 5], center=true);
    translate([26, 21, 2.5]) cube([1, 1, 5], center=true);
    translate([26, 22, 2.5]) cube([1, 1, 5], center=true);
    translate([26, 23, 2.5]) cube([1, 1, 5], center=true);
    translate([26, 24, 2.5]) cube([1, 1, 5], center=true);
    translate([26, 25, 2.5]) cube([1, 1, 5], center=true);
    translate([26, 26, 2.5]) cube([1, 1, 5], center=true);
    translate([26, 27, 2.5]) cube([1, 1, 5], center=true);
    translate([26, 28, 4.0]) cube([1, 1, 8], center=true);
    translate([26, 29, 4.5]) cube([1, 1, 9], center=true);
    translate([27, 0, 4.5]) cube([1, 1, 9], center=true);
    translate([27, 1, 4.0]) cube([1, 1, 8], center=true);
    translate([27, 2, 3.5]) cube([1, 1, 7], center=true);
    translate([27, 3, 3.0]) cube([1, 1, 6], center=true);
    translate([27, 4, 2.5]) cube([1, 1, 5], center=true);
    translate([27, 5, 2.5]) cube([1, 1, 5], center=true);
    translate([27, 6, 2.5]) cube([1, 1, 5], center=true);
    translate([27, 7, 2.5]) cube([1, 1, 5], center=true);
    translate([27, 8, 2.5]) cube([1, 1, 5], center=true);
    translate([27, 9, 2.5]) cube([1, 1, 5], center=true);
    translate([27, 10, 2.5]) cube([1, 1, 5], center=true);
    translate([27, 11, 2.5]) cube([1, 1, 5], center=true);
    translate([27, 12, 2.5]) cube([1, 1, 5], center=true);
    translate([27, 13, 2.5]) cube([1, 1, 5], center=true);
    translate([27, 14, 2.5]) cube([1, 1, 5], center=true);
    translate([27, 15, 2.5]) cube([1, 1, 5], center=true);
    translate([27, 16, 2.5]) cube([1, 1, 5], center=true);
    translate([27, 17, 2.5]) cube([1, 1, 5], center=true);
    translate([27, 18, 2.5]) cube([1, 1, 5], center=true);
    translate([27, 19, 2.5]) cube([1, 1, 5], center=true);
    translate([27, 20, 2.5]) cube([1, 1, 5], center=true);
    translate([27, 21, 2.5]) cube([1, 1, 5], center=true);
    translate([27, 22, 2.5]) cube([1, 1, 5], center=true);
    translate([27, 23, 2.5]) cube([1, 1, 5], center=true);
    translate([27, 24, 2.5]) cube([1, 1, 5], center=true);
    translate([27, 25, 2.5]) cube([1, 1, 5], center=true);
    translate([27, 26, 2.5]) cube([1, 1, 5], center=true);
    translate([27, 27, 2.5]) cube([1, 1, 5], center=true);
    translate([27, 28, 4.0]) cube([1, 1, 8], center=true);
    translate([27, 29, 4.5]) cube([1, 1, 9], center=true);
    translate([28, 0, 4.5]) cube([1, 1, 9], center=true);
    translate([28, 1, 4.0]) cube([1, 1, 8], center=true);
    translate([28, 2, 3.5]) cube([1, 1, 7], center=true);
    translate([28, 3, 3.0]) cube([1, 1, 6], center=true);
    translate([28, 4, 2.5]) cube([1, 1, 5], center=true);
    translate([28, 5, 2.5]) cube([1, 1, 5], center=true);
    translate([28, 6, 2.5]) cube([1, 1, 5], center=true);
    translate([28, 7, 2.5]) cube([1, 1, 5], center=true);
    translate([28, 8, 2.5]) cube([1, 1, 5], center=true);
    translate([28, 9, 2.5]) cube([1, 1, 5], center=true);
    translate([28, 10, 2.5]) cube([1, 1, 5], center=true);
    translate([28, 11, 2.5]) cube([1, 1, 5], center=true);
    translate([28, 12, 2.5]) cube([1, 1, 5], center=true);
    translate([28, 13, 2.5]) cube([1, 1, 5], center=true);
    translate([28, 14, 2.5]) cube([1, 1, 5], center=true);
    translate([28, 15, 2.5]) cube([1, 1, 5], center=true);
    translate([28, 16, 2.5]) cube([1, 1, 5], center=true);
    translate([28, 17, 2.5]) cube([1, 1, 5], center=true);
    translate([28, 18, 2.5]) cube([1, 1, 5], center=true);
    translate([28, 19, 2.5]) cube([1, 1, 5], center=true);
    translate([28, 20, 2.5]) cube([1, 1, 5], center=true);
    translate([28, 21, 2.5]) cube([1, 1, 5], center=true);
    translate([28, 22, 2.5]) cube([1, 1, 5], center=true);
    translate([28, 23, 2.5]) cube([1, 1, 5], center=true);
    translate([28, 24, 2.5]) cube([1, 1, 5], center=true);
    translate([28, 25, 2.5]) cube([1, 1, 5], center=true);
    translate([28, 26, 2.5]) cube([1, 1, 5], center=true);
    translate([28, 27, 2.5]) cube([1, 1, 5], center=true);
    translate([28, 28, 4.0]) cube([1, 1, 8], center=true);
    translate([28, 29, 4.5]) cube([1, 1, 9], center=true);
    translate([29, 0, 4.5]) cube([1, 1, 9], center=true);
    translate([29, 1, 4.5]) cube([1, 1, 9], center=true);
    translate([29, 2, 4.5]) cube([1, 1, 9], center=true);
    translate([29, 3, 4.5]) cube([1, 1, 9], center=true);
    translate([29, 4, 4.5]) cube([1, 1, 9], center=true);
    translate([29, 5, 4.5]) cube([1, 1, 9], center=true);
    translate([29, 6, 4.5]) cube([1, 1, 9], center=true);
    translate([29, 7, 4.5]) cube([1, 1, 9], center=true);
    translate([29, 8, 4.5]) cube([1, 1, 9], center=true);
    translate([29, 9, 4.5]) cube([1, 1, 9], center=true);
    translate([29, 10, 4.5]) cube([1, 1, 9], center=true);
    translate([29, 11, 4.5]) cube([1, 1, 9], center=true);
    translate([29, 12, 4.5]) cube([1, 1, 9], center=true);
    translate([29, 13, 4.5]) cube([1, 1, 9], center=true);
    translate([29, 14, 4.5]) cube([1, 1, 9], center=true);
    translate([29, 15, 4.5]) cube([1, 1, 9], center=true);
    translate([29, 16, 4.5]) cube([1, 1, 9], center=true);
    translate([29, 17, 4.5]) cube([1, 1, 9], center=true);
    translate([29, 18, 4.5]) cube([1, 1, 9], center=true);
    translate([29, 19, 4.5]) cube([1, 1, 9], center=true);
    translate([29, 20, 4.5]) cube([1, 1, 9], center=true);
    translate([29, 21, 4.5]) cube([1, 1, 9], center=true);
    translate([29, 22, 4.5]) cube([1, 1, 9], center=true);
    translate([29, 23, 4.5]) cube([1, 1, 9], center=true);
    translate([29, 24, 4.5]) cube([1, 1, 9], center=true);
    translate([29, 25, 4.5]) cube([1, 1, 9], center=true);
    translate([29, 26, 4.5]) cube([1, 1, 9], center=true);
    translate([29, 27, 4.5]) cube([1, 1, 9], center=true);
    translate([29, 28, 4.5]) cube([1, 1, 9], center=true);
    translate([29, 29, 4.5]) cube([1, 1, 9], center=true);
}
